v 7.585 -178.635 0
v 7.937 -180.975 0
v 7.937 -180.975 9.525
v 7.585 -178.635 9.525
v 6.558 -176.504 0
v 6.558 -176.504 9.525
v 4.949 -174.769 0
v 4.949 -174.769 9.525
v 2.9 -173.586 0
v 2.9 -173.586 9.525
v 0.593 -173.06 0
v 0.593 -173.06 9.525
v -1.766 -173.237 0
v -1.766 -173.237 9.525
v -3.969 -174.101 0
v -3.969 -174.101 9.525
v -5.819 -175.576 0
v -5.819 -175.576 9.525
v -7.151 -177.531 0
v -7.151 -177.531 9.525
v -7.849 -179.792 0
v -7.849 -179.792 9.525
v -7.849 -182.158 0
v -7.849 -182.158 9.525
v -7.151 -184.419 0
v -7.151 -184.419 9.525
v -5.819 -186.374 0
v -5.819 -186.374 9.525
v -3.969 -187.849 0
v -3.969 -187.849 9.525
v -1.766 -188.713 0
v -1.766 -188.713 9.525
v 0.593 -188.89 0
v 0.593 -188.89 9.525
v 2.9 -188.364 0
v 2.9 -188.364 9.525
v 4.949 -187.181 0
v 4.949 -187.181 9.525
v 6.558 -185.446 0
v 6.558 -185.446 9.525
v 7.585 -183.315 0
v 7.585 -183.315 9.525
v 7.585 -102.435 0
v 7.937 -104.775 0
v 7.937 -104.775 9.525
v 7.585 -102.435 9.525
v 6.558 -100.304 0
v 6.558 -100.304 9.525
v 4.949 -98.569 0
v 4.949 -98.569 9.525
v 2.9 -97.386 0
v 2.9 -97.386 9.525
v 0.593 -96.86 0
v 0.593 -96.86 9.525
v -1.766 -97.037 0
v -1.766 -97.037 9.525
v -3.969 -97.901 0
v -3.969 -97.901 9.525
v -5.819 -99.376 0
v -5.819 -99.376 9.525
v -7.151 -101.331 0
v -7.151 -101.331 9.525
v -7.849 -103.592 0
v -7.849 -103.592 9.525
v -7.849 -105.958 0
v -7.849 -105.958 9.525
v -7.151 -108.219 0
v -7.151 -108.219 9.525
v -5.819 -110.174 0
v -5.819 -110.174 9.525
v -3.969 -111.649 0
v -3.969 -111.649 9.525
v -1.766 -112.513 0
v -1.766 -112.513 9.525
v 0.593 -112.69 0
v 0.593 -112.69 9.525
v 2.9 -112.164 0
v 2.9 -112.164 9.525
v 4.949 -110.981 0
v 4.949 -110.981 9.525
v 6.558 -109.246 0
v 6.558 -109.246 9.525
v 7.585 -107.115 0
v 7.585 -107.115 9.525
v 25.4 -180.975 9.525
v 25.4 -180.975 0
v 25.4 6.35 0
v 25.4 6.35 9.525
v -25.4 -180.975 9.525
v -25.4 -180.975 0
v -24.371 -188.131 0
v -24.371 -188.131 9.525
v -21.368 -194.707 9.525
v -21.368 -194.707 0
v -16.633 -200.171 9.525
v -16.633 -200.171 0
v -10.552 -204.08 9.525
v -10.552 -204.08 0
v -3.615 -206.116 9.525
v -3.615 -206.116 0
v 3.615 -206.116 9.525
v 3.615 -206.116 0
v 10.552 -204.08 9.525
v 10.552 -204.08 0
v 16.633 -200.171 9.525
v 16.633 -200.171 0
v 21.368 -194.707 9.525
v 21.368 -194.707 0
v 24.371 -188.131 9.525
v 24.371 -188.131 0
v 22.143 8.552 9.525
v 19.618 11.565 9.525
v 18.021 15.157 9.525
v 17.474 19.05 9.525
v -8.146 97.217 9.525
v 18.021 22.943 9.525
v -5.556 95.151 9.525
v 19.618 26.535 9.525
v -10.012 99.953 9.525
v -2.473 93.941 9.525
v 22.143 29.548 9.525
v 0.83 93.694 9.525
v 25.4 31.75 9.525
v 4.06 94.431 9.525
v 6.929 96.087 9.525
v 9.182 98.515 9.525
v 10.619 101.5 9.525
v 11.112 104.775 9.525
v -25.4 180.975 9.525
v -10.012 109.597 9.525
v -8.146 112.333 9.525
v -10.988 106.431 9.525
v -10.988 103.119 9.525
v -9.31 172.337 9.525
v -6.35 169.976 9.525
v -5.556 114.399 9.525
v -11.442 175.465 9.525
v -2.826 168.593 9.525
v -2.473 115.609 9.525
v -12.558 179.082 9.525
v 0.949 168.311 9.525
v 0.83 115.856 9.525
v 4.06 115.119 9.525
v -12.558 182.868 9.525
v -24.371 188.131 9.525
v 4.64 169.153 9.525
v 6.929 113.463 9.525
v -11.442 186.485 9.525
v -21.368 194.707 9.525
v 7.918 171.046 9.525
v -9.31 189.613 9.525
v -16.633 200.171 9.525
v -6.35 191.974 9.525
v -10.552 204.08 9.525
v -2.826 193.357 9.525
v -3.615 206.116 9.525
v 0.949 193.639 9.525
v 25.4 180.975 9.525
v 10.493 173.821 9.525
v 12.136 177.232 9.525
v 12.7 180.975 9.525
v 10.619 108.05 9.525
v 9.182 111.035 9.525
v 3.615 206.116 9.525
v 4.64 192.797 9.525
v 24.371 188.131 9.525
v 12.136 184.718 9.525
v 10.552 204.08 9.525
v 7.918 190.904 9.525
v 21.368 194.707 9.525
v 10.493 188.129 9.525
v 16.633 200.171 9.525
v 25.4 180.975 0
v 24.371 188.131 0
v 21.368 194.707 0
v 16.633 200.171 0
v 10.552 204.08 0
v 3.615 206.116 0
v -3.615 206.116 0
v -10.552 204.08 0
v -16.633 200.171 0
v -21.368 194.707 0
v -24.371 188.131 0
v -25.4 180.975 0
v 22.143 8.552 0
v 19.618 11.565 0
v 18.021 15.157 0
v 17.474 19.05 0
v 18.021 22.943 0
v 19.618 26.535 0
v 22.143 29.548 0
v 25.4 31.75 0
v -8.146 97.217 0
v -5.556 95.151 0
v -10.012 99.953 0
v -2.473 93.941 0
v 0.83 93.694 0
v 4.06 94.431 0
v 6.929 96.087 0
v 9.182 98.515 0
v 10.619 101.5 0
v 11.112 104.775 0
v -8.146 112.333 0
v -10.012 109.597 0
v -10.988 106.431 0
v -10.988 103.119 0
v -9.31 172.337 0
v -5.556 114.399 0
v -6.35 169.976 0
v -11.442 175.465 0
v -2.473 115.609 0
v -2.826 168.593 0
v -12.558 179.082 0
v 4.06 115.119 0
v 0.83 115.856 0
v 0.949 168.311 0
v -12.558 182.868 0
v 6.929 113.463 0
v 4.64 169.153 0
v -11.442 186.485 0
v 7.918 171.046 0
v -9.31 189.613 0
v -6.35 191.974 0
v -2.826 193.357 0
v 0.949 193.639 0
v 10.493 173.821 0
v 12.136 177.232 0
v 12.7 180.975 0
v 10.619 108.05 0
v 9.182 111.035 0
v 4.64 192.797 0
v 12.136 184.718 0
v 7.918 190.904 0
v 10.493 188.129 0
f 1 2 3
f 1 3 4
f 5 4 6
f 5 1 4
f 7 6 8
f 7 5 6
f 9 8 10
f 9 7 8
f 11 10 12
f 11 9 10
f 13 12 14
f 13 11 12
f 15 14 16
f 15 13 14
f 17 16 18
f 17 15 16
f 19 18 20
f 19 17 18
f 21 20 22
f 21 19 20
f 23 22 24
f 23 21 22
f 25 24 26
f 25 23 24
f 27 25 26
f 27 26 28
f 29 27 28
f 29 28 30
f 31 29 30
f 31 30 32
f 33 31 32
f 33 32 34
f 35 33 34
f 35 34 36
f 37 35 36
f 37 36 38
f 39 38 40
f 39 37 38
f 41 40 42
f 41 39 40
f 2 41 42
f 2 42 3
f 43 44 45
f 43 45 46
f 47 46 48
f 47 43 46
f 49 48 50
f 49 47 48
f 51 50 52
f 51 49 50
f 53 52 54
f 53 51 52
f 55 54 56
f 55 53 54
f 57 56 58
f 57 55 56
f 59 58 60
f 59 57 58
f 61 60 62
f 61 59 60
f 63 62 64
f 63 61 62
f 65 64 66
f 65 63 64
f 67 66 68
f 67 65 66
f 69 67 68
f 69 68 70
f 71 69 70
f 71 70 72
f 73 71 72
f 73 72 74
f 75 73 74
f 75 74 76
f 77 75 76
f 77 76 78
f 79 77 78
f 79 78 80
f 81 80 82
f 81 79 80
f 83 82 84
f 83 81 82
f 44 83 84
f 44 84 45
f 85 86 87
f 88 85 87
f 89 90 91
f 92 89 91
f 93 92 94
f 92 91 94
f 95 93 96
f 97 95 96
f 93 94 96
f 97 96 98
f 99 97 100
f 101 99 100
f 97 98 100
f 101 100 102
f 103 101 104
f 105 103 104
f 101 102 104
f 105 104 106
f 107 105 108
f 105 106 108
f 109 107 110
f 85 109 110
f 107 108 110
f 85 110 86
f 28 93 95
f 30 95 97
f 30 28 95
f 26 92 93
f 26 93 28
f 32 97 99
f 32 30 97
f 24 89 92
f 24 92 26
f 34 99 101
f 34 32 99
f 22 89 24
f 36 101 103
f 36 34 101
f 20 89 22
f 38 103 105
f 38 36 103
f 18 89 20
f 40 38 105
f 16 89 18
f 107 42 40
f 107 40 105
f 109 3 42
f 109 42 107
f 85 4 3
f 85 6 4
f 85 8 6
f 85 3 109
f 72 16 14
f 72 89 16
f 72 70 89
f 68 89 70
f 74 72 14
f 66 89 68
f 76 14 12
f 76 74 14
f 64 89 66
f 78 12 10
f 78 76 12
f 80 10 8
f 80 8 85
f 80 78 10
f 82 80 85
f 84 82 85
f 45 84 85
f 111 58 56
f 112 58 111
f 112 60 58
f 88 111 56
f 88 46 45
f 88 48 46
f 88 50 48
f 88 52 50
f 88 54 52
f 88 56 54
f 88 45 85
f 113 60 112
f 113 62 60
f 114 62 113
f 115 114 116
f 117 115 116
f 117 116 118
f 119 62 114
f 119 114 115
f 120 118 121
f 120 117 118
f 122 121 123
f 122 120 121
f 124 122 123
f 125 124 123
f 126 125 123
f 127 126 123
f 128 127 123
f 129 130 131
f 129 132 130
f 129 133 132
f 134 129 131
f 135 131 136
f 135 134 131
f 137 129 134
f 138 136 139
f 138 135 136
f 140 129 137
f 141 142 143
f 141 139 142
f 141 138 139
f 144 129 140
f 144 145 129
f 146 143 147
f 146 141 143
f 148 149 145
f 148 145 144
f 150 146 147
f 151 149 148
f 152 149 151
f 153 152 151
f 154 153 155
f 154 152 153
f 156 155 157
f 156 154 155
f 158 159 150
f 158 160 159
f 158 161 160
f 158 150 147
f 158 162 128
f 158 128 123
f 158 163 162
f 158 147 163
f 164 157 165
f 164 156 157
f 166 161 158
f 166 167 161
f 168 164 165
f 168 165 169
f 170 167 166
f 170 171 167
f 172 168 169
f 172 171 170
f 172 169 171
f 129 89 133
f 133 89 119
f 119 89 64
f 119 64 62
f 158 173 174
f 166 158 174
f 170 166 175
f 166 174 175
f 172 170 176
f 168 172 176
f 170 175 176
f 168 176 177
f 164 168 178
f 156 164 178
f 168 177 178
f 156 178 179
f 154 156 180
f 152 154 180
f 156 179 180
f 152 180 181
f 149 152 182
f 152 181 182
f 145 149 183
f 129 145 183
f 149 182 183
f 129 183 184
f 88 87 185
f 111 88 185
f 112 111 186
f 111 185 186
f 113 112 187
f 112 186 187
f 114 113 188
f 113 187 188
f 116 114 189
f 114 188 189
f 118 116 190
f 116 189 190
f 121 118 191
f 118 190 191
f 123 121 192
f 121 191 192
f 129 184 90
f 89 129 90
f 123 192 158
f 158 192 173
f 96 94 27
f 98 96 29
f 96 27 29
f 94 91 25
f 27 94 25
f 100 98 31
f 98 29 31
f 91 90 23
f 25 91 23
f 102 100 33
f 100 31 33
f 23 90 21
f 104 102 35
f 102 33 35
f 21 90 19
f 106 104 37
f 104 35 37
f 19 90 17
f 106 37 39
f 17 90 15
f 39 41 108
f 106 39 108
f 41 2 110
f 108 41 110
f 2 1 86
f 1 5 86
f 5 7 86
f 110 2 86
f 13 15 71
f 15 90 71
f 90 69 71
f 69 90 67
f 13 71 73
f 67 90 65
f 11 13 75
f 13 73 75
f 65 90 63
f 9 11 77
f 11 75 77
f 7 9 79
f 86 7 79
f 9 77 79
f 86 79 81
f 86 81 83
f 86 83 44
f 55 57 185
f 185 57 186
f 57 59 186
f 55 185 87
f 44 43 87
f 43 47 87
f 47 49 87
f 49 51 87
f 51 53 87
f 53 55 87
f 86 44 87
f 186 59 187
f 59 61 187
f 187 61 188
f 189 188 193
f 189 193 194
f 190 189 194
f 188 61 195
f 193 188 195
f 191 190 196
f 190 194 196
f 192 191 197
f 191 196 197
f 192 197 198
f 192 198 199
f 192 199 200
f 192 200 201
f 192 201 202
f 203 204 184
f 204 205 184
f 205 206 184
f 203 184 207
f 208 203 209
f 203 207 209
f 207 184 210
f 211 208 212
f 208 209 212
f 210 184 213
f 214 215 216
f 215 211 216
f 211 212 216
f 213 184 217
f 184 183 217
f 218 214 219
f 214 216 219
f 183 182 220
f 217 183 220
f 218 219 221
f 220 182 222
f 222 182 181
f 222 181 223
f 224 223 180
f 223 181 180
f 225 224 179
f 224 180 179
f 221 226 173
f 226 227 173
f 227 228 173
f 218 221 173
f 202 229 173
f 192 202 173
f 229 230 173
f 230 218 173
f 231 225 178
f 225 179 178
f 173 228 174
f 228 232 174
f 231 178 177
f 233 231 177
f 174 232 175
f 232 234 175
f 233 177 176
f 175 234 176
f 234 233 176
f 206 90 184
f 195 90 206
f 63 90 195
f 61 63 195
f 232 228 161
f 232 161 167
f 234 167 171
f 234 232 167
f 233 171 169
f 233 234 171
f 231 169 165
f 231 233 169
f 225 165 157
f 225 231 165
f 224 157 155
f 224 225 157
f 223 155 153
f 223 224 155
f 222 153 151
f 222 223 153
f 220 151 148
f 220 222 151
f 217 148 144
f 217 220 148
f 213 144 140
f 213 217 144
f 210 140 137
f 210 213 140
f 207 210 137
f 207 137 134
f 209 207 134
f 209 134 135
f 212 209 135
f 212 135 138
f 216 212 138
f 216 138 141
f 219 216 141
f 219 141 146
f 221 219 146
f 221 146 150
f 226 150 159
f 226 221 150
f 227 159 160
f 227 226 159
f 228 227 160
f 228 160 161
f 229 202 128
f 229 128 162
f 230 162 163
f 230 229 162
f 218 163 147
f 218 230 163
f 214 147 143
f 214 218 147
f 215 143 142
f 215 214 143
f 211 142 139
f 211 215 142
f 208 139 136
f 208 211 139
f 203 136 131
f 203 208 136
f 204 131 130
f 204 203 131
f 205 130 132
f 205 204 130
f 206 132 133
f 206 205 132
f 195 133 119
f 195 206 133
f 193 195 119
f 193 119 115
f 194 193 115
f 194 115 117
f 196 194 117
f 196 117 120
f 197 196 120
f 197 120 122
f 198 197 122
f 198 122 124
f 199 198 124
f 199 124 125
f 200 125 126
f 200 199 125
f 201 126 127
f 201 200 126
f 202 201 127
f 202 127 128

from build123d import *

# Parameters (mm, degrees)
F1_R     = 7.9375
F1_R_2   = 11.1125
F1_R_3   = 12.7
F2_DEPTH = 9.525


with BuildPart() as f2:
    # F1 (on Top) → F2 (new body)
    with BuildSketch(Plane.XY):
        with BuildLine():
            ThreePointArc((25.399975, 180.975), (-1.3e-05, 206.374987), (-25.4, 180.975))
            Line((-25.4, 180.975), (-25.4, -180.975))
            ThreePointArc((-25.4, -180.975), (-1.3e-05, -206.374987), (25.399975, -180.975))
            Line((25.399975, -180.975), (25.399975, 6.35))
            ThreePointArc((25.399975, 6.35), (17.474131, 19.05), (25.399975, 31.75))
            Line((25.399975, 31.75), (25.399975, 180.975))
        make_face()
        with Locations((-2.5e-05, -180.975)):
            Circle(F1_R, mode=Mode.SUBTRACT)
        with Locations((-2.5e-05, -104.775)):
            Circle(F1_R, mode=Mode.SUBTRACT)
        with Locations((-2.5e-05, 104.775)):
            Circle(F1_R_2, mode=Mode.SUBTRACT)
        with Locations((-2.5e-05, 180.975)):
            Circle(F1_R_3, mode=Mode.SUBTRACT)
    extrude(amount=F2_DEPTH)


solid = f2.part
